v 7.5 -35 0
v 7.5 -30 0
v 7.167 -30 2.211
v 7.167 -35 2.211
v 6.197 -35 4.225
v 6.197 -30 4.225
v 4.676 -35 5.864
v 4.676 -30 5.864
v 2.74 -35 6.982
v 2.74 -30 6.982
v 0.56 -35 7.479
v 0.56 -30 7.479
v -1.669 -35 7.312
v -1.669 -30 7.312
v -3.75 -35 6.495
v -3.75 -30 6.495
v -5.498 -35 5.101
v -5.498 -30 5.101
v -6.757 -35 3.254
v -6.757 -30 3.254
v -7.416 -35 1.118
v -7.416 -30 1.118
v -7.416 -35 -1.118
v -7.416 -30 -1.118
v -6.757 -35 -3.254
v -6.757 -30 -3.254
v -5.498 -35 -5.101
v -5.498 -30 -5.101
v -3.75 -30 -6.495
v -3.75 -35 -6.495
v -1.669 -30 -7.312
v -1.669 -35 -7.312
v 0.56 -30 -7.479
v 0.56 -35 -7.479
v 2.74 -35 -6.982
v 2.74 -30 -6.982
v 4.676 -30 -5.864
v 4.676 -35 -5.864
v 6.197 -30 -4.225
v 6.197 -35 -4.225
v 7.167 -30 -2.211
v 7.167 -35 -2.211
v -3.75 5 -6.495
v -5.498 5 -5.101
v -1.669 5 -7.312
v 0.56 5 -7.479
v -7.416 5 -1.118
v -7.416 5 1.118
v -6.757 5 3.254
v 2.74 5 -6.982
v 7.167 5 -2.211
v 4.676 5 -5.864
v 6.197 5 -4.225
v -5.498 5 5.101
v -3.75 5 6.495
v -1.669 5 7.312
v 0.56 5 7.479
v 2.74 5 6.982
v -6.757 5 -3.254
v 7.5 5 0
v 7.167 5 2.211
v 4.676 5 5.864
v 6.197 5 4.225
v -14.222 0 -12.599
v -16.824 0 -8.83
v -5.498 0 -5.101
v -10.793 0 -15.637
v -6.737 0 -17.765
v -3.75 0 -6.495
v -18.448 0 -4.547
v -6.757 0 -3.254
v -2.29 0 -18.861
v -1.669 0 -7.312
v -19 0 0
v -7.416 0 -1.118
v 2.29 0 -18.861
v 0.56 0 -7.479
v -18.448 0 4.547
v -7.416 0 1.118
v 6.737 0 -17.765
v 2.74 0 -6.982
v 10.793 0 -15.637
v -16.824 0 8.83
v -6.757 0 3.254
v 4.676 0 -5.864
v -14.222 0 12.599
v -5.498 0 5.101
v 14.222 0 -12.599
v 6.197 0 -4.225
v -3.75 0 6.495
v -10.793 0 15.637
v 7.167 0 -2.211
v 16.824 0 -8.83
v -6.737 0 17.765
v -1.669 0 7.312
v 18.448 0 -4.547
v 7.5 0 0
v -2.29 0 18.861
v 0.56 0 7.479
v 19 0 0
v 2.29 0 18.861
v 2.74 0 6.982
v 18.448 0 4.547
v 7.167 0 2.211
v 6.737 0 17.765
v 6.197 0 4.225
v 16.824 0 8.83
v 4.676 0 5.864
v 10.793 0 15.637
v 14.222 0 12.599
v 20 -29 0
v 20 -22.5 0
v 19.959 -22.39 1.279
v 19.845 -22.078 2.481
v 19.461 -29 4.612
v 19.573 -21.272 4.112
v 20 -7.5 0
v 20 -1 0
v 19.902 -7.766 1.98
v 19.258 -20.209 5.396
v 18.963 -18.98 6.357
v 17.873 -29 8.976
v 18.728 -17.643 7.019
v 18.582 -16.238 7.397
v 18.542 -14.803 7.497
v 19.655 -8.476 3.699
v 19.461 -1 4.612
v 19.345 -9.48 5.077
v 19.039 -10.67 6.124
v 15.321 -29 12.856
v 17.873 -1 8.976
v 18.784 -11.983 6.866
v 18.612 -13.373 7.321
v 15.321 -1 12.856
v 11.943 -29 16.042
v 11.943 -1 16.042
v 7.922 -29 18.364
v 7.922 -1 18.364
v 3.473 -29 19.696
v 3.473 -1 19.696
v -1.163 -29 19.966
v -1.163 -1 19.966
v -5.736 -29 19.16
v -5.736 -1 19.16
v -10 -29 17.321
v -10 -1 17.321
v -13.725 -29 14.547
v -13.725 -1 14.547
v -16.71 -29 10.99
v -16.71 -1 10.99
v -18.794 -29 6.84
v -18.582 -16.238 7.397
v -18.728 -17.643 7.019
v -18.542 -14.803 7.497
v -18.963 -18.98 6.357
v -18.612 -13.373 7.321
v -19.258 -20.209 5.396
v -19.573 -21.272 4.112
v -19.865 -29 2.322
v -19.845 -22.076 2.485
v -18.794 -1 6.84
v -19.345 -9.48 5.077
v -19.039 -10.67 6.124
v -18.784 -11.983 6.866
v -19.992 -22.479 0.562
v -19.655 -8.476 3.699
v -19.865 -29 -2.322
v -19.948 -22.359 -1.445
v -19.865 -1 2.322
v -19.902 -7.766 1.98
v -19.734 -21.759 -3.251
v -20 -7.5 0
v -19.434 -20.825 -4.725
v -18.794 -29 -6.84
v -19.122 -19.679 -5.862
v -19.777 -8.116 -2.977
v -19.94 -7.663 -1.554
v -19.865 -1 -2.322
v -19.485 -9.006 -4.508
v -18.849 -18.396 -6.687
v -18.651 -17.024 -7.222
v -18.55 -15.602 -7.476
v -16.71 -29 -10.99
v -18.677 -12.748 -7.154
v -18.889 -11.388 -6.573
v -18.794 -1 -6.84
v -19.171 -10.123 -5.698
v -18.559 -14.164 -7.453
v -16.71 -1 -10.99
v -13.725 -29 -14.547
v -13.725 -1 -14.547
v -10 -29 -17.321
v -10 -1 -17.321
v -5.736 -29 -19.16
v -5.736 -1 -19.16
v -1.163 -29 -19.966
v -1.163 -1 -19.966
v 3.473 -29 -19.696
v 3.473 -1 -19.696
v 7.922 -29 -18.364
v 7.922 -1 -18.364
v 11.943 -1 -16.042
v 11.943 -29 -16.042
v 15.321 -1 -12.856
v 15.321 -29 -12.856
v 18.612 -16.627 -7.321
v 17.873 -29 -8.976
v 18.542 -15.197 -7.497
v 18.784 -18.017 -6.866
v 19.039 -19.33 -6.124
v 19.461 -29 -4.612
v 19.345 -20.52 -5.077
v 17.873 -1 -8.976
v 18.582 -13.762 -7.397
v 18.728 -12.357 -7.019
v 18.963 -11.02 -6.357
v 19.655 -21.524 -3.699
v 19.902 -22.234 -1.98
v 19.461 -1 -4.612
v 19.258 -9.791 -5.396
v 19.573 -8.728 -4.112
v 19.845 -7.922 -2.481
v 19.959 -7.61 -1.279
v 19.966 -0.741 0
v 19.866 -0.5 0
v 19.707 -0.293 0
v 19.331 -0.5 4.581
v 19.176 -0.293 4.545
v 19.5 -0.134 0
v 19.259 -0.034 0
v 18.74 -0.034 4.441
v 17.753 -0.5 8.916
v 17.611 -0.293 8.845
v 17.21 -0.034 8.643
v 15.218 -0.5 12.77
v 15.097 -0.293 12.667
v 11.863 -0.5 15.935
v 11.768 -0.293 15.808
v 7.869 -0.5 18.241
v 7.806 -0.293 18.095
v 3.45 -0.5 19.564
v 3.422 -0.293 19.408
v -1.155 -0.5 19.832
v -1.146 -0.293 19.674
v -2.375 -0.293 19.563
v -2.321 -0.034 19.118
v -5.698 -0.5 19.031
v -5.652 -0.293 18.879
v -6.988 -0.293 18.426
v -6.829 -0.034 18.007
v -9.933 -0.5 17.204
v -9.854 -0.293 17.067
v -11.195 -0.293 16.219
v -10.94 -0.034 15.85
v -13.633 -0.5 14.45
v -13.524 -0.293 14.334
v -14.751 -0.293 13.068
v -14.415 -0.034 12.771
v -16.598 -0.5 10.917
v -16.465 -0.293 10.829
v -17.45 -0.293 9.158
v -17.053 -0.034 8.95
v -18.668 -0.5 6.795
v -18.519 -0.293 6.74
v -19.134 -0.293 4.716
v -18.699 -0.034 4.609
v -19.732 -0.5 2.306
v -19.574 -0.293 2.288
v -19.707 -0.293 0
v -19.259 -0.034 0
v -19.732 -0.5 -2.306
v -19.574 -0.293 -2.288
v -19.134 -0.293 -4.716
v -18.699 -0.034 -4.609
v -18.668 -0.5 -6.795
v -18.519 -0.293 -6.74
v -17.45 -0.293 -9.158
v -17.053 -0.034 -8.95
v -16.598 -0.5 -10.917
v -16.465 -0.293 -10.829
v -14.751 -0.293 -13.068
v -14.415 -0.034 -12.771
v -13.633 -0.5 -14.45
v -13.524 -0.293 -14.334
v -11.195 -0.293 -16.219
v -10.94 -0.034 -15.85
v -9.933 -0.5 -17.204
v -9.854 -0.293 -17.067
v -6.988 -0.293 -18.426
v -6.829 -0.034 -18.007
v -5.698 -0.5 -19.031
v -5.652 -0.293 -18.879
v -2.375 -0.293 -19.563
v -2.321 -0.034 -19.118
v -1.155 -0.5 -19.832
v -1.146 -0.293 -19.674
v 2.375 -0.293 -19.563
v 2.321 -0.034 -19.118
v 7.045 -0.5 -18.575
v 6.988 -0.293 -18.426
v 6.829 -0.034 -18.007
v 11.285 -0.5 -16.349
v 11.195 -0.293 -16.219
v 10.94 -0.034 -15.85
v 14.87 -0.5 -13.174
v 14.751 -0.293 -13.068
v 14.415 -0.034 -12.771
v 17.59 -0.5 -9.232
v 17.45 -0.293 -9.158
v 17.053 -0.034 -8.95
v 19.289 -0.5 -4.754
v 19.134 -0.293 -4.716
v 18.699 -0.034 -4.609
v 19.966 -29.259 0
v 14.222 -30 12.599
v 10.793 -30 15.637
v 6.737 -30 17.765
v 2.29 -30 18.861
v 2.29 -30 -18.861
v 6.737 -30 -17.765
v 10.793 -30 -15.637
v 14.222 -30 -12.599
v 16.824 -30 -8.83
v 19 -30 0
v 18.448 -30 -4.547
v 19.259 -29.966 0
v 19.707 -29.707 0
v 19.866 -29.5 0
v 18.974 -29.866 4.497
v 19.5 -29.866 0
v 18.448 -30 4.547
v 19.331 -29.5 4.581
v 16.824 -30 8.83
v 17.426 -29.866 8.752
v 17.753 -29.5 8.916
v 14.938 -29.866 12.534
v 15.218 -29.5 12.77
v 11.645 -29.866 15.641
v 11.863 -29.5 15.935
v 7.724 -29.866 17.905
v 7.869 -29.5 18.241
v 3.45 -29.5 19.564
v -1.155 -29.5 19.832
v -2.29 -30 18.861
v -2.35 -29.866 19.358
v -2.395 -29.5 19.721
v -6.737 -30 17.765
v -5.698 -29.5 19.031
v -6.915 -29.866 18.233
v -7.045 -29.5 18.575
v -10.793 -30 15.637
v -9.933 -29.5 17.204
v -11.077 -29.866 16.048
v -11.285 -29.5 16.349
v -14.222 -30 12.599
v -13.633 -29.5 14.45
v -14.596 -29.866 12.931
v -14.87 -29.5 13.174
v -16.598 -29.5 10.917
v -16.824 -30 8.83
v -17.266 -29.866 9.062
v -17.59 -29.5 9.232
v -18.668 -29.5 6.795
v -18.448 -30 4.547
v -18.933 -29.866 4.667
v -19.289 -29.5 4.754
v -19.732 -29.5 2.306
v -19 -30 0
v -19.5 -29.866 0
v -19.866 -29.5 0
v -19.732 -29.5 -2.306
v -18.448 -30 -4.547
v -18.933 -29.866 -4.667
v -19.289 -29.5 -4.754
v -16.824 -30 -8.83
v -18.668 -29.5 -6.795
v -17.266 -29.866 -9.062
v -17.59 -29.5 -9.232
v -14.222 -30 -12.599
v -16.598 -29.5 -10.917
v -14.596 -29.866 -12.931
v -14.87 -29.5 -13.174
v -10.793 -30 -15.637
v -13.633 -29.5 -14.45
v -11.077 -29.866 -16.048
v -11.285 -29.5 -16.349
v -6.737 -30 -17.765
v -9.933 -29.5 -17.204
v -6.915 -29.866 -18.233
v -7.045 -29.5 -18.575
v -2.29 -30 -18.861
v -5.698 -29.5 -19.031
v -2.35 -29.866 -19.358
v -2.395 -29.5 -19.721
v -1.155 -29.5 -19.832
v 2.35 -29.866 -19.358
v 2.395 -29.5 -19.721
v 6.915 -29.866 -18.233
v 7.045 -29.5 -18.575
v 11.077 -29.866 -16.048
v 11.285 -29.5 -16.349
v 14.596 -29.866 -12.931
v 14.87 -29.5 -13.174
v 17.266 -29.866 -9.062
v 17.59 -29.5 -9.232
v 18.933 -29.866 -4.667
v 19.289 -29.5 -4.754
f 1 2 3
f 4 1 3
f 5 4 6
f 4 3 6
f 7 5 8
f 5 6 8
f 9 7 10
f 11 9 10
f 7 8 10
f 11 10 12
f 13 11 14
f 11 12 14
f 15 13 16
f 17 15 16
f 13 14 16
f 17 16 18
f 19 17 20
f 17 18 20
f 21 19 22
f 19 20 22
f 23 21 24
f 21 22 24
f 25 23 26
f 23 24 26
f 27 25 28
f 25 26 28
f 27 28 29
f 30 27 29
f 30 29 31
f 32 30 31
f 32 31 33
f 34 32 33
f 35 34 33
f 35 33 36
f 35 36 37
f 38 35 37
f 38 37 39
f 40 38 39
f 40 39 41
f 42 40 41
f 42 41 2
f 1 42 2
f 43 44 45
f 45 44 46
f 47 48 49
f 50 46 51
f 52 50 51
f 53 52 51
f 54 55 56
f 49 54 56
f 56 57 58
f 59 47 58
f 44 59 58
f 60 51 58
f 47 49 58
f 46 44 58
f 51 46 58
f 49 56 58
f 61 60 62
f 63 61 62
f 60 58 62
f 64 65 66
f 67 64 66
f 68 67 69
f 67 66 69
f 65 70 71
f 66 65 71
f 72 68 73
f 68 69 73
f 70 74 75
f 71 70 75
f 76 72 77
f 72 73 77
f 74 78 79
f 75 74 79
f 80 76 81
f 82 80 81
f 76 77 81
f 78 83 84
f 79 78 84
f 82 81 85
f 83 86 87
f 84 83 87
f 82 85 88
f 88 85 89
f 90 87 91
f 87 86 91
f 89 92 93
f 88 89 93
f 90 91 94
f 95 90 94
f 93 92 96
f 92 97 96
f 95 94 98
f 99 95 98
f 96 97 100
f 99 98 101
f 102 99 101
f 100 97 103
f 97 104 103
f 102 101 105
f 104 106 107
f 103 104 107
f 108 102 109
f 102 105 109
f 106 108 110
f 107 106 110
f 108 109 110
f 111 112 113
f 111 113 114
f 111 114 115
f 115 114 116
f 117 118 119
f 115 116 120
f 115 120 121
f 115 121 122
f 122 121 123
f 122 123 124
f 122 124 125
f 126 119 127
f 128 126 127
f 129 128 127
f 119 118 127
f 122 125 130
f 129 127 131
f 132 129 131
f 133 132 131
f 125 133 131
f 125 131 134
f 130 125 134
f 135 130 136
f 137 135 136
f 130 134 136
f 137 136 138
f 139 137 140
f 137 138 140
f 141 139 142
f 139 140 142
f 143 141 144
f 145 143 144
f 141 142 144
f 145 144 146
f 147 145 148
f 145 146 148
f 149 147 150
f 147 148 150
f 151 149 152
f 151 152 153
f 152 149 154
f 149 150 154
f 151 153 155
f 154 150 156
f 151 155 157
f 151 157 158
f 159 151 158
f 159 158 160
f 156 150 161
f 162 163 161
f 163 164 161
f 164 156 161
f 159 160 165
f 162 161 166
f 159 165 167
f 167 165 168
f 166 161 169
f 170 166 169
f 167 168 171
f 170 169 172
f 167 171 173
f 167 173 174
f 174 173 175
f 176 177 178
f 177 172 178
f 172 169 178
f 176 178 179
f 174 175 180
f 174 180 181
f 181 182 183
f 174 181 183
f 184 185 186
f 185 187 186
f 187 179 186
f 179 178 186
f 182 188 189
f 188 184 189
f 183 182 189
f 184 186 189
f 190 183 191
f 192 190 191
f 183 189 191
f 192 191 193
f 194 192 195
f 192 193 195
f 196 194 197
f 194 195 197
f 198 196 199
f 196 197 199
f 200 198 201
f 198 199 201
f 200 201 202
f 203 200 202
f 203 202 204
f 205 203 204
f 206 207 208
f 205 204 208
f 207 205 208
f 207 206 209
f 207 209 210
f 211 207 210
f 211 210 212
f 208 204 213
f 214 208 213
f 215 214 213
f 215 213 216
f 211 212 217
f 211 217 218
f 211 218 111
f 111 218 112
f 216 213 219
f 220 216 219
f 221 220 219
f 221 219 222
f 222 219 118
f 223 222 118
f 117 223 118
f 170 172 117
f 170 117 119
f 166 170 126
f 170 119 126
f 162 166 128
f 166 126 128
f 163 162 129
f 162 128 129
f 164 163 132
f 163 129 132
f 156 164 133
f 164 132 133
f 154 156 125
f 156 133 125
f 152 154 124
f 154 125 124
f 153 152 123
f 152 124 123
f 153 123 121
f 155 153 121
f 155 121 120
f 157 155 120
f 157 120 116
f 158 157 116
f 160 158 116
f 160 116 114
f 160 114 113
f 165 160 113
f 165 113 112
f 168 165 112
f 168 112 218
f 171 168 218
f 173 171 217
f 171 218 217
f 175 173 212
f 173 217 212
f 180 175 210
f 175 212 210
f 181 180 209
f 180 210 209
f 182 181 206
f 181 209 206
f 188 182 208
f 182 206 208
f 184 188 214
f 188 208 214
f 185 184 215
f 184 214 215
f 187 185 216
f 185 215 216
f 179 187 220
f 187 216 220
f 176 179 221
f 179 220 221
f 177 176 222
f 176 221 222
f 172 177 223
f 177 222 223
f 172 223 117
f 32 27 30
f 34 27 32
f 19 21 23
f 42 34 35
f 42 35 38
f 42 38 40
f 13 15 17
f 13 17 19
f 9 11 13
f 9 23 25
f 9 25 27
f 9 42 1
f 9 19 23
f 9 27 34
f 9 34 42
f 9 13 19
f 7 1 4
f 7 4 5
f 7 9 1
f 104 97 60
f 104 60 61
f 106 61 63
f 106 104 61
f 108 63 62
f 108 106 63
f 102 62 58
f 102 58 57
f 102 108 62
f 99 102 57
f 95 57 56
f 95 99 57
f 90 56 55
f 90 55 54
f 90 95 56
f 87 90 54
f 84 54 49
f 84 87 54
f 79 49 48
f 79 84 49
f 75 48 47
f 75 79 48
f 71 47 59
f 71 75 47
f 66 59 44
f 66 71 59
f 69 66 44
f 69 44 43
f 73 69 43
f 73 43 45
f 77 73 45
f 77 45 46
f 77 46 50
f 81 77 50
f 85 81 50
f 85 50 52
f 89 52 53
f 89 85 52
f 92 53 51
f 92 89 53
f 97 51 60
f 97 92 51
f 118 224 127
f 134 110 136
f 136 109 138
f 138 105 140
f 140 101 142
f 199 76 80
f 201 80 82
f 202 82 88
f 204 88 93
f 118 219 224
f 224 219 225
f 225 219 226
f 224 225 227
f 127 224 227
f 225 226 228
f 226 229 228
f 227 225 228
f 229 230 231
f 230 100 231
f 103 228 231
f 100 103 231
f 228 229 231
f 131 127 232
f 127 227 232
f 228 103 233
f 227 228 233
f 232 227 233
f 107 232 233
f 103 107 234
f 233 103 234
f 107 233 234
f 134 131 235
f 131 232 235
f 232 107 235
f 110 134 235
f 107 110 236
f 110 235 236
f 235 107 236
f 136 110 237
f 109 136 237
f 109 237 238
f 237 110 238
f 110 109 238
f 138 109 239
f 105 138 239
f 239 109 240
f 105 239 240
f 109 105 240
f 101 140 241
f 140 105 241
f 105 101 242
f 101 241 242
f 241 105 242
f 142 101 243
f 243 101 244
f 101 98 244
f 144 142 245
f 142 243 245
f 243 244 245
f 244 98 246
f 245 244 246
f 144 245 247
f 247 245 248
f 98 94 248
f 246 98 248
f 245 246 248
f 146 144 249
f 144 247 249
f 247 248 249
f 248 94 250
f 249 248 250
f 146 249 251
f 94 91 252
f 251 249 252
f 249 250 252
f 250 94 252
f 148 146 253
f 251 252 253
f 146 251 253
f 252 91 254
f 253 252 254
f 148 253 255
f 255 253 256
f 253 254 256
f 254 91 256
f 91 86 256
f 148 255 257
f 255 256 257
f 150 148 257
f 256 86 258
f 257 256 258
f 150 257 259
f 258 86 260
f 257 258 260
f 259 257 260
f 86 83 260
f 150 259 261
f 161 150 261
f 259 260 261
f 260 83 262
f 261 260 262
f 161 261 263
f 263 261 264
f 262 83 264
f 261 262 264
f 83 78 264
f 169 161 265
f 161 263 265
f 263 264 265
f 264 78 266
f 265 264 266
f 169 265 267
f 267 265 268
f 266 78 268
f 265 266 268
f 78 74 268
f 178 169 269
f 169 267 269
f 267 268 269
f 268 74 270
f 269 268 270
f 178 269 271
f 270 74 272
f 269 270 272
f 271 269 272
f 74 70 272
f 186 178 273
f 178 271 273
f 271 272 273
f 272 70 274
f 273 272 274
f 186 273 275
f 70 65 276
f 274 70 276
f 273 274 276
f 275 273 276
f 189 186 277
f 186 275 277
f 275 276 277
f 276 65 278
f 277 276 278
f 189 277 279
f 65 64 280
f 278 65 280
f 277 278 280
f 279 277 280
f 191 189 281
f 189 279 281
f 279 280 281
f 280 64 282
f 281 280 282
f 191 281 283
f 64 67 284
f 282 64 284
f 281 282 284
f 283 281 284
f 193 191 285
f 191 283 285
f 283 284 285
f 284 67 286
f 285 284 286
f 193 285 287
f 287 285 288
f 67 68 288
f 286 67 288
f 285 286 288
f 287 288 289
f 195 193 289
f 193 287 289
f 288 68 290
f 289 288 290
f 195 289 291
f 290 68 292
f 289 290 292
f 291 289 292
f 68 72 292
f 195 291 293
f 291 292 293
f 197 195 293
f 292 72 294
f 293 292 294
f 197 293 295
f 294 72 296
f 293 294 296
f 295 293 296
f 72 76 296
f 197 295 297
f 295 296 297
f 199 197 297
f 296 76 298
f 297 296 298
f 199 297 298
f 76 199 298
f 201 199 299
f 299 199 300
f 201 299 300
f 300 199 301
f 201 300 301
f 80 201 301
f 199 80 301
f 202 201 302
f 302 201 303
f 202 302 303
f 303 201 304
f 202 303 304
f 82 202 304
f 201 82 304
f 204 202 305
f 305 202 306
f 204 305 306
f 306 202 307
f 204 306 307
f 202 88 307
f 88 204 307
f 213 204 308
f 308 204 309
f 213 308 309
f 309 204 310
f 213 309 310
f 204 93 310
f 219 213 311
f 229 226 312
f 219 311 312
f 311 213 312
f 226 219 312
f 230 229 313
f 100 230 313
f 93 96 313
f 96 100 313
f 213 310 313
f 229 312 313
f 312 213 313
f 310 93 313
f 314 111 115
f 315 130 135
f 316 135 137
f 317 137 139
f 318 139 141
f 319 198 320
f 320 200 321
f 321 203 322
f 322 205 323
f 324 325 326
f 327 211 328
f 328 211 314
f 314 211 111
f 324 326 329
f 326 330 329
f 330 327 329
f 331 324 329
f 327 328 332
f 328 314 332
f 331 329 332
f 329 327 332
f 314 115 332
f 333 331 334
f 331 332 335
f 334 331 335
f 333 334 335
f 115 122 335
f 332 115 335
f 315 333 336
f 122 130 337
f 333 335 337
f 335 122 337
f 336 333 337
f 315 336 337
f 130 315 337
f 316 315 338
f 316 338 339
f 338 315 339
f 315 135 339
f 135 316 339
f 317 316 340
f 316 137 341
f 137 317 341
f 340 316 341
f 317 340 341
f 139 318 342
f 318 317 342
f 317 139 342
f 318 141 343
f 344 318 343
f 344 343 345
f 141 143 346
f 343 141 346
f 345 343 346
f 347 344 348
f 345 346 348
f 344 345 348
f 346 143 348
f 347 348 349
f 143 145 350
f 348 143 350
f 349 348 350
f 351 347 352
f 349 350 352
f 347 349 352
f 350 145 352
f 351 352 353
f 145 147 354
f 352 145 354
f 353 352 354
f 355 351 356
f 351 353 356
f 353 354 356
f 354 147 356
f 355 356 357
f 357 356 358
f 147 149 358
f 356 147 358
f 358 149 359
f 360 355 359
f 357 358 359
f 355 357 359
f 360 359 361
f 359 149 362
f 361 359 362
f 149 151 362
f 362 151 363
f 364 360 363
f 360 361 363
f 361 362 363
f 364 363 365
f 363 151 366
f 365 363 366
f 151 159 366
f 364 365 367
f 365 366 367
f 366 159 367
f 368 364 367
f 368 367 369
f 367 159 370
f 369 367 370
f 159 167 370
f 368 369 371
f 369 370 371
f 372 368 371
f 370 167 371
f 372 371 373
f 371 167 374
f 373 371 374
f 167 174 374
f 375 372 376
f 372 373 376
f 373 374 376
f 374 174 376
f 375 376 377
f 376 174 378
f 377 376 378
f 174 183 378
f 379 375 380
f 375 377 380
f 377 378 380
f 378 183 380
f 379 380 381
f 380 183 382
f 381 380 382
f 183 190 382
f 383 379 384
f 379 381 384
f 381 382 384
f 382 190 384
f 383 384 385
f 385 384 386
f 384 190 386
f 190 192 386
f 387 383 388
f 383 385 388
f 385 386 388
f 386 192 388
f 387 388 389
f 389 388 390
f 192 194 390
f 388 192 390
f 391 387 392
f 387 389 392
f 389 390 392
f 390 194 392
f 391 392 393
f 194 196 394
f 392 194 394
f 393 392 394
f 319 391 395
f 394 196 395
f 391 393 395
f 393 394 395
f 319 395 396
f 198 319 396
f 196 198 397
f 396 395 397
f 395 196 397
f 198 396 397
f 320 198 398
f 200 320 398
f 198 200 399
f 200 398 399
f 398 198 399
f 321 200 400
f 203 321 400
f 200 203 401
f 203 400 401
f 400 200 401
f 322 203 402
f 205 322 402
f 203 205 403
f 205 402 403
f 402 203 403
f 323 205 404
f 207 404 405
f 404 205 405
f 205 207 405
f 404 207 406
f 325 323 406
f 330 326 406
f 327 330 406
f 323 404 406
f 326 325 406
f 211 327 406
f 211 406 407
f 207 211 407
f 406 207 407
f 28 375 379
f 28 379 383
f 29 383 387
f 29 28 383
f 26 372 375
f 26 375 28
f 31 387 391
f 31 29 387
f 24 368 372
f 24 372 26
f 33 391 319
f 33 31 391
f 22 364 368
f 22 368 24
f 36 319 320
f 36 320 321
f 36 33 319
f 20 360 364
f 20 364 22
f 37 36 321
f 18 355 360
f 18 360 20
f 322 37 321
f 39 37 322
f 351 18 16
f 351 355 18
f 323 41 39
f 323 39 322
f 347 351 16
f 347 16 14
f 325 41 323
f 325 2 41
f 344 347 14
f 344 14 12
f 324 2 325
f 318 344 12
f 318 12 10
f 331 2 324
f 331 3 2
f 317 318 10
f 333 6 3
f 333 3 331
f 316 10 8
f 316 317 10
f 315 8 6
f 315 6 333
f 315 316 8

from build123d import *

# Parameters (mm, degrees)
F0_R          = 20
F0_R_2        = 7.5
F1_DEPTH      = 30
F2_DEPTH      = 35
F2_DEPTH_BACK = 5
F4_R          = 7.5
F5_DEPTH      = 40.001
F6_R          = 1


with BuildPart() as f1:
    # F0 (on Front) → F1 (new body)
    with BuildSketch(Plane.XZ):
        Circle(F0_R)
        Circle(F0_R_2, mode=Mode.SUBTRACT)
    extrude(amount=F1_DEPTH)

    # F0 (on Front) → F2 (join, two sides)
    with BuildSketch(Plane.XZ) as f2_sk:
        Circle(F0_R_2)
    extrude(amount=F2_DEPTH)
    extrude(f2_sk.sketch, amount=-F2_DEPTH_BACK)

    # F4 (on offset) → F5 (cut, through all)
    with BuildSketch(Plane.YZ.offset(20)):
        with Locations((-15, 0)):
            Circle(F4_R)
    extrude(amount=-F5_DEPTH, mode=Mode.SUBTRACT)

    # F6
    f6_edges = [f1.edges().sort_by_distance(p)[0] for p in [
        (-20, -30, 0),
        (-20, 0, 0),
    ]]
    fillet(f6_edges, radius=F6_R)


solid = f1.part
